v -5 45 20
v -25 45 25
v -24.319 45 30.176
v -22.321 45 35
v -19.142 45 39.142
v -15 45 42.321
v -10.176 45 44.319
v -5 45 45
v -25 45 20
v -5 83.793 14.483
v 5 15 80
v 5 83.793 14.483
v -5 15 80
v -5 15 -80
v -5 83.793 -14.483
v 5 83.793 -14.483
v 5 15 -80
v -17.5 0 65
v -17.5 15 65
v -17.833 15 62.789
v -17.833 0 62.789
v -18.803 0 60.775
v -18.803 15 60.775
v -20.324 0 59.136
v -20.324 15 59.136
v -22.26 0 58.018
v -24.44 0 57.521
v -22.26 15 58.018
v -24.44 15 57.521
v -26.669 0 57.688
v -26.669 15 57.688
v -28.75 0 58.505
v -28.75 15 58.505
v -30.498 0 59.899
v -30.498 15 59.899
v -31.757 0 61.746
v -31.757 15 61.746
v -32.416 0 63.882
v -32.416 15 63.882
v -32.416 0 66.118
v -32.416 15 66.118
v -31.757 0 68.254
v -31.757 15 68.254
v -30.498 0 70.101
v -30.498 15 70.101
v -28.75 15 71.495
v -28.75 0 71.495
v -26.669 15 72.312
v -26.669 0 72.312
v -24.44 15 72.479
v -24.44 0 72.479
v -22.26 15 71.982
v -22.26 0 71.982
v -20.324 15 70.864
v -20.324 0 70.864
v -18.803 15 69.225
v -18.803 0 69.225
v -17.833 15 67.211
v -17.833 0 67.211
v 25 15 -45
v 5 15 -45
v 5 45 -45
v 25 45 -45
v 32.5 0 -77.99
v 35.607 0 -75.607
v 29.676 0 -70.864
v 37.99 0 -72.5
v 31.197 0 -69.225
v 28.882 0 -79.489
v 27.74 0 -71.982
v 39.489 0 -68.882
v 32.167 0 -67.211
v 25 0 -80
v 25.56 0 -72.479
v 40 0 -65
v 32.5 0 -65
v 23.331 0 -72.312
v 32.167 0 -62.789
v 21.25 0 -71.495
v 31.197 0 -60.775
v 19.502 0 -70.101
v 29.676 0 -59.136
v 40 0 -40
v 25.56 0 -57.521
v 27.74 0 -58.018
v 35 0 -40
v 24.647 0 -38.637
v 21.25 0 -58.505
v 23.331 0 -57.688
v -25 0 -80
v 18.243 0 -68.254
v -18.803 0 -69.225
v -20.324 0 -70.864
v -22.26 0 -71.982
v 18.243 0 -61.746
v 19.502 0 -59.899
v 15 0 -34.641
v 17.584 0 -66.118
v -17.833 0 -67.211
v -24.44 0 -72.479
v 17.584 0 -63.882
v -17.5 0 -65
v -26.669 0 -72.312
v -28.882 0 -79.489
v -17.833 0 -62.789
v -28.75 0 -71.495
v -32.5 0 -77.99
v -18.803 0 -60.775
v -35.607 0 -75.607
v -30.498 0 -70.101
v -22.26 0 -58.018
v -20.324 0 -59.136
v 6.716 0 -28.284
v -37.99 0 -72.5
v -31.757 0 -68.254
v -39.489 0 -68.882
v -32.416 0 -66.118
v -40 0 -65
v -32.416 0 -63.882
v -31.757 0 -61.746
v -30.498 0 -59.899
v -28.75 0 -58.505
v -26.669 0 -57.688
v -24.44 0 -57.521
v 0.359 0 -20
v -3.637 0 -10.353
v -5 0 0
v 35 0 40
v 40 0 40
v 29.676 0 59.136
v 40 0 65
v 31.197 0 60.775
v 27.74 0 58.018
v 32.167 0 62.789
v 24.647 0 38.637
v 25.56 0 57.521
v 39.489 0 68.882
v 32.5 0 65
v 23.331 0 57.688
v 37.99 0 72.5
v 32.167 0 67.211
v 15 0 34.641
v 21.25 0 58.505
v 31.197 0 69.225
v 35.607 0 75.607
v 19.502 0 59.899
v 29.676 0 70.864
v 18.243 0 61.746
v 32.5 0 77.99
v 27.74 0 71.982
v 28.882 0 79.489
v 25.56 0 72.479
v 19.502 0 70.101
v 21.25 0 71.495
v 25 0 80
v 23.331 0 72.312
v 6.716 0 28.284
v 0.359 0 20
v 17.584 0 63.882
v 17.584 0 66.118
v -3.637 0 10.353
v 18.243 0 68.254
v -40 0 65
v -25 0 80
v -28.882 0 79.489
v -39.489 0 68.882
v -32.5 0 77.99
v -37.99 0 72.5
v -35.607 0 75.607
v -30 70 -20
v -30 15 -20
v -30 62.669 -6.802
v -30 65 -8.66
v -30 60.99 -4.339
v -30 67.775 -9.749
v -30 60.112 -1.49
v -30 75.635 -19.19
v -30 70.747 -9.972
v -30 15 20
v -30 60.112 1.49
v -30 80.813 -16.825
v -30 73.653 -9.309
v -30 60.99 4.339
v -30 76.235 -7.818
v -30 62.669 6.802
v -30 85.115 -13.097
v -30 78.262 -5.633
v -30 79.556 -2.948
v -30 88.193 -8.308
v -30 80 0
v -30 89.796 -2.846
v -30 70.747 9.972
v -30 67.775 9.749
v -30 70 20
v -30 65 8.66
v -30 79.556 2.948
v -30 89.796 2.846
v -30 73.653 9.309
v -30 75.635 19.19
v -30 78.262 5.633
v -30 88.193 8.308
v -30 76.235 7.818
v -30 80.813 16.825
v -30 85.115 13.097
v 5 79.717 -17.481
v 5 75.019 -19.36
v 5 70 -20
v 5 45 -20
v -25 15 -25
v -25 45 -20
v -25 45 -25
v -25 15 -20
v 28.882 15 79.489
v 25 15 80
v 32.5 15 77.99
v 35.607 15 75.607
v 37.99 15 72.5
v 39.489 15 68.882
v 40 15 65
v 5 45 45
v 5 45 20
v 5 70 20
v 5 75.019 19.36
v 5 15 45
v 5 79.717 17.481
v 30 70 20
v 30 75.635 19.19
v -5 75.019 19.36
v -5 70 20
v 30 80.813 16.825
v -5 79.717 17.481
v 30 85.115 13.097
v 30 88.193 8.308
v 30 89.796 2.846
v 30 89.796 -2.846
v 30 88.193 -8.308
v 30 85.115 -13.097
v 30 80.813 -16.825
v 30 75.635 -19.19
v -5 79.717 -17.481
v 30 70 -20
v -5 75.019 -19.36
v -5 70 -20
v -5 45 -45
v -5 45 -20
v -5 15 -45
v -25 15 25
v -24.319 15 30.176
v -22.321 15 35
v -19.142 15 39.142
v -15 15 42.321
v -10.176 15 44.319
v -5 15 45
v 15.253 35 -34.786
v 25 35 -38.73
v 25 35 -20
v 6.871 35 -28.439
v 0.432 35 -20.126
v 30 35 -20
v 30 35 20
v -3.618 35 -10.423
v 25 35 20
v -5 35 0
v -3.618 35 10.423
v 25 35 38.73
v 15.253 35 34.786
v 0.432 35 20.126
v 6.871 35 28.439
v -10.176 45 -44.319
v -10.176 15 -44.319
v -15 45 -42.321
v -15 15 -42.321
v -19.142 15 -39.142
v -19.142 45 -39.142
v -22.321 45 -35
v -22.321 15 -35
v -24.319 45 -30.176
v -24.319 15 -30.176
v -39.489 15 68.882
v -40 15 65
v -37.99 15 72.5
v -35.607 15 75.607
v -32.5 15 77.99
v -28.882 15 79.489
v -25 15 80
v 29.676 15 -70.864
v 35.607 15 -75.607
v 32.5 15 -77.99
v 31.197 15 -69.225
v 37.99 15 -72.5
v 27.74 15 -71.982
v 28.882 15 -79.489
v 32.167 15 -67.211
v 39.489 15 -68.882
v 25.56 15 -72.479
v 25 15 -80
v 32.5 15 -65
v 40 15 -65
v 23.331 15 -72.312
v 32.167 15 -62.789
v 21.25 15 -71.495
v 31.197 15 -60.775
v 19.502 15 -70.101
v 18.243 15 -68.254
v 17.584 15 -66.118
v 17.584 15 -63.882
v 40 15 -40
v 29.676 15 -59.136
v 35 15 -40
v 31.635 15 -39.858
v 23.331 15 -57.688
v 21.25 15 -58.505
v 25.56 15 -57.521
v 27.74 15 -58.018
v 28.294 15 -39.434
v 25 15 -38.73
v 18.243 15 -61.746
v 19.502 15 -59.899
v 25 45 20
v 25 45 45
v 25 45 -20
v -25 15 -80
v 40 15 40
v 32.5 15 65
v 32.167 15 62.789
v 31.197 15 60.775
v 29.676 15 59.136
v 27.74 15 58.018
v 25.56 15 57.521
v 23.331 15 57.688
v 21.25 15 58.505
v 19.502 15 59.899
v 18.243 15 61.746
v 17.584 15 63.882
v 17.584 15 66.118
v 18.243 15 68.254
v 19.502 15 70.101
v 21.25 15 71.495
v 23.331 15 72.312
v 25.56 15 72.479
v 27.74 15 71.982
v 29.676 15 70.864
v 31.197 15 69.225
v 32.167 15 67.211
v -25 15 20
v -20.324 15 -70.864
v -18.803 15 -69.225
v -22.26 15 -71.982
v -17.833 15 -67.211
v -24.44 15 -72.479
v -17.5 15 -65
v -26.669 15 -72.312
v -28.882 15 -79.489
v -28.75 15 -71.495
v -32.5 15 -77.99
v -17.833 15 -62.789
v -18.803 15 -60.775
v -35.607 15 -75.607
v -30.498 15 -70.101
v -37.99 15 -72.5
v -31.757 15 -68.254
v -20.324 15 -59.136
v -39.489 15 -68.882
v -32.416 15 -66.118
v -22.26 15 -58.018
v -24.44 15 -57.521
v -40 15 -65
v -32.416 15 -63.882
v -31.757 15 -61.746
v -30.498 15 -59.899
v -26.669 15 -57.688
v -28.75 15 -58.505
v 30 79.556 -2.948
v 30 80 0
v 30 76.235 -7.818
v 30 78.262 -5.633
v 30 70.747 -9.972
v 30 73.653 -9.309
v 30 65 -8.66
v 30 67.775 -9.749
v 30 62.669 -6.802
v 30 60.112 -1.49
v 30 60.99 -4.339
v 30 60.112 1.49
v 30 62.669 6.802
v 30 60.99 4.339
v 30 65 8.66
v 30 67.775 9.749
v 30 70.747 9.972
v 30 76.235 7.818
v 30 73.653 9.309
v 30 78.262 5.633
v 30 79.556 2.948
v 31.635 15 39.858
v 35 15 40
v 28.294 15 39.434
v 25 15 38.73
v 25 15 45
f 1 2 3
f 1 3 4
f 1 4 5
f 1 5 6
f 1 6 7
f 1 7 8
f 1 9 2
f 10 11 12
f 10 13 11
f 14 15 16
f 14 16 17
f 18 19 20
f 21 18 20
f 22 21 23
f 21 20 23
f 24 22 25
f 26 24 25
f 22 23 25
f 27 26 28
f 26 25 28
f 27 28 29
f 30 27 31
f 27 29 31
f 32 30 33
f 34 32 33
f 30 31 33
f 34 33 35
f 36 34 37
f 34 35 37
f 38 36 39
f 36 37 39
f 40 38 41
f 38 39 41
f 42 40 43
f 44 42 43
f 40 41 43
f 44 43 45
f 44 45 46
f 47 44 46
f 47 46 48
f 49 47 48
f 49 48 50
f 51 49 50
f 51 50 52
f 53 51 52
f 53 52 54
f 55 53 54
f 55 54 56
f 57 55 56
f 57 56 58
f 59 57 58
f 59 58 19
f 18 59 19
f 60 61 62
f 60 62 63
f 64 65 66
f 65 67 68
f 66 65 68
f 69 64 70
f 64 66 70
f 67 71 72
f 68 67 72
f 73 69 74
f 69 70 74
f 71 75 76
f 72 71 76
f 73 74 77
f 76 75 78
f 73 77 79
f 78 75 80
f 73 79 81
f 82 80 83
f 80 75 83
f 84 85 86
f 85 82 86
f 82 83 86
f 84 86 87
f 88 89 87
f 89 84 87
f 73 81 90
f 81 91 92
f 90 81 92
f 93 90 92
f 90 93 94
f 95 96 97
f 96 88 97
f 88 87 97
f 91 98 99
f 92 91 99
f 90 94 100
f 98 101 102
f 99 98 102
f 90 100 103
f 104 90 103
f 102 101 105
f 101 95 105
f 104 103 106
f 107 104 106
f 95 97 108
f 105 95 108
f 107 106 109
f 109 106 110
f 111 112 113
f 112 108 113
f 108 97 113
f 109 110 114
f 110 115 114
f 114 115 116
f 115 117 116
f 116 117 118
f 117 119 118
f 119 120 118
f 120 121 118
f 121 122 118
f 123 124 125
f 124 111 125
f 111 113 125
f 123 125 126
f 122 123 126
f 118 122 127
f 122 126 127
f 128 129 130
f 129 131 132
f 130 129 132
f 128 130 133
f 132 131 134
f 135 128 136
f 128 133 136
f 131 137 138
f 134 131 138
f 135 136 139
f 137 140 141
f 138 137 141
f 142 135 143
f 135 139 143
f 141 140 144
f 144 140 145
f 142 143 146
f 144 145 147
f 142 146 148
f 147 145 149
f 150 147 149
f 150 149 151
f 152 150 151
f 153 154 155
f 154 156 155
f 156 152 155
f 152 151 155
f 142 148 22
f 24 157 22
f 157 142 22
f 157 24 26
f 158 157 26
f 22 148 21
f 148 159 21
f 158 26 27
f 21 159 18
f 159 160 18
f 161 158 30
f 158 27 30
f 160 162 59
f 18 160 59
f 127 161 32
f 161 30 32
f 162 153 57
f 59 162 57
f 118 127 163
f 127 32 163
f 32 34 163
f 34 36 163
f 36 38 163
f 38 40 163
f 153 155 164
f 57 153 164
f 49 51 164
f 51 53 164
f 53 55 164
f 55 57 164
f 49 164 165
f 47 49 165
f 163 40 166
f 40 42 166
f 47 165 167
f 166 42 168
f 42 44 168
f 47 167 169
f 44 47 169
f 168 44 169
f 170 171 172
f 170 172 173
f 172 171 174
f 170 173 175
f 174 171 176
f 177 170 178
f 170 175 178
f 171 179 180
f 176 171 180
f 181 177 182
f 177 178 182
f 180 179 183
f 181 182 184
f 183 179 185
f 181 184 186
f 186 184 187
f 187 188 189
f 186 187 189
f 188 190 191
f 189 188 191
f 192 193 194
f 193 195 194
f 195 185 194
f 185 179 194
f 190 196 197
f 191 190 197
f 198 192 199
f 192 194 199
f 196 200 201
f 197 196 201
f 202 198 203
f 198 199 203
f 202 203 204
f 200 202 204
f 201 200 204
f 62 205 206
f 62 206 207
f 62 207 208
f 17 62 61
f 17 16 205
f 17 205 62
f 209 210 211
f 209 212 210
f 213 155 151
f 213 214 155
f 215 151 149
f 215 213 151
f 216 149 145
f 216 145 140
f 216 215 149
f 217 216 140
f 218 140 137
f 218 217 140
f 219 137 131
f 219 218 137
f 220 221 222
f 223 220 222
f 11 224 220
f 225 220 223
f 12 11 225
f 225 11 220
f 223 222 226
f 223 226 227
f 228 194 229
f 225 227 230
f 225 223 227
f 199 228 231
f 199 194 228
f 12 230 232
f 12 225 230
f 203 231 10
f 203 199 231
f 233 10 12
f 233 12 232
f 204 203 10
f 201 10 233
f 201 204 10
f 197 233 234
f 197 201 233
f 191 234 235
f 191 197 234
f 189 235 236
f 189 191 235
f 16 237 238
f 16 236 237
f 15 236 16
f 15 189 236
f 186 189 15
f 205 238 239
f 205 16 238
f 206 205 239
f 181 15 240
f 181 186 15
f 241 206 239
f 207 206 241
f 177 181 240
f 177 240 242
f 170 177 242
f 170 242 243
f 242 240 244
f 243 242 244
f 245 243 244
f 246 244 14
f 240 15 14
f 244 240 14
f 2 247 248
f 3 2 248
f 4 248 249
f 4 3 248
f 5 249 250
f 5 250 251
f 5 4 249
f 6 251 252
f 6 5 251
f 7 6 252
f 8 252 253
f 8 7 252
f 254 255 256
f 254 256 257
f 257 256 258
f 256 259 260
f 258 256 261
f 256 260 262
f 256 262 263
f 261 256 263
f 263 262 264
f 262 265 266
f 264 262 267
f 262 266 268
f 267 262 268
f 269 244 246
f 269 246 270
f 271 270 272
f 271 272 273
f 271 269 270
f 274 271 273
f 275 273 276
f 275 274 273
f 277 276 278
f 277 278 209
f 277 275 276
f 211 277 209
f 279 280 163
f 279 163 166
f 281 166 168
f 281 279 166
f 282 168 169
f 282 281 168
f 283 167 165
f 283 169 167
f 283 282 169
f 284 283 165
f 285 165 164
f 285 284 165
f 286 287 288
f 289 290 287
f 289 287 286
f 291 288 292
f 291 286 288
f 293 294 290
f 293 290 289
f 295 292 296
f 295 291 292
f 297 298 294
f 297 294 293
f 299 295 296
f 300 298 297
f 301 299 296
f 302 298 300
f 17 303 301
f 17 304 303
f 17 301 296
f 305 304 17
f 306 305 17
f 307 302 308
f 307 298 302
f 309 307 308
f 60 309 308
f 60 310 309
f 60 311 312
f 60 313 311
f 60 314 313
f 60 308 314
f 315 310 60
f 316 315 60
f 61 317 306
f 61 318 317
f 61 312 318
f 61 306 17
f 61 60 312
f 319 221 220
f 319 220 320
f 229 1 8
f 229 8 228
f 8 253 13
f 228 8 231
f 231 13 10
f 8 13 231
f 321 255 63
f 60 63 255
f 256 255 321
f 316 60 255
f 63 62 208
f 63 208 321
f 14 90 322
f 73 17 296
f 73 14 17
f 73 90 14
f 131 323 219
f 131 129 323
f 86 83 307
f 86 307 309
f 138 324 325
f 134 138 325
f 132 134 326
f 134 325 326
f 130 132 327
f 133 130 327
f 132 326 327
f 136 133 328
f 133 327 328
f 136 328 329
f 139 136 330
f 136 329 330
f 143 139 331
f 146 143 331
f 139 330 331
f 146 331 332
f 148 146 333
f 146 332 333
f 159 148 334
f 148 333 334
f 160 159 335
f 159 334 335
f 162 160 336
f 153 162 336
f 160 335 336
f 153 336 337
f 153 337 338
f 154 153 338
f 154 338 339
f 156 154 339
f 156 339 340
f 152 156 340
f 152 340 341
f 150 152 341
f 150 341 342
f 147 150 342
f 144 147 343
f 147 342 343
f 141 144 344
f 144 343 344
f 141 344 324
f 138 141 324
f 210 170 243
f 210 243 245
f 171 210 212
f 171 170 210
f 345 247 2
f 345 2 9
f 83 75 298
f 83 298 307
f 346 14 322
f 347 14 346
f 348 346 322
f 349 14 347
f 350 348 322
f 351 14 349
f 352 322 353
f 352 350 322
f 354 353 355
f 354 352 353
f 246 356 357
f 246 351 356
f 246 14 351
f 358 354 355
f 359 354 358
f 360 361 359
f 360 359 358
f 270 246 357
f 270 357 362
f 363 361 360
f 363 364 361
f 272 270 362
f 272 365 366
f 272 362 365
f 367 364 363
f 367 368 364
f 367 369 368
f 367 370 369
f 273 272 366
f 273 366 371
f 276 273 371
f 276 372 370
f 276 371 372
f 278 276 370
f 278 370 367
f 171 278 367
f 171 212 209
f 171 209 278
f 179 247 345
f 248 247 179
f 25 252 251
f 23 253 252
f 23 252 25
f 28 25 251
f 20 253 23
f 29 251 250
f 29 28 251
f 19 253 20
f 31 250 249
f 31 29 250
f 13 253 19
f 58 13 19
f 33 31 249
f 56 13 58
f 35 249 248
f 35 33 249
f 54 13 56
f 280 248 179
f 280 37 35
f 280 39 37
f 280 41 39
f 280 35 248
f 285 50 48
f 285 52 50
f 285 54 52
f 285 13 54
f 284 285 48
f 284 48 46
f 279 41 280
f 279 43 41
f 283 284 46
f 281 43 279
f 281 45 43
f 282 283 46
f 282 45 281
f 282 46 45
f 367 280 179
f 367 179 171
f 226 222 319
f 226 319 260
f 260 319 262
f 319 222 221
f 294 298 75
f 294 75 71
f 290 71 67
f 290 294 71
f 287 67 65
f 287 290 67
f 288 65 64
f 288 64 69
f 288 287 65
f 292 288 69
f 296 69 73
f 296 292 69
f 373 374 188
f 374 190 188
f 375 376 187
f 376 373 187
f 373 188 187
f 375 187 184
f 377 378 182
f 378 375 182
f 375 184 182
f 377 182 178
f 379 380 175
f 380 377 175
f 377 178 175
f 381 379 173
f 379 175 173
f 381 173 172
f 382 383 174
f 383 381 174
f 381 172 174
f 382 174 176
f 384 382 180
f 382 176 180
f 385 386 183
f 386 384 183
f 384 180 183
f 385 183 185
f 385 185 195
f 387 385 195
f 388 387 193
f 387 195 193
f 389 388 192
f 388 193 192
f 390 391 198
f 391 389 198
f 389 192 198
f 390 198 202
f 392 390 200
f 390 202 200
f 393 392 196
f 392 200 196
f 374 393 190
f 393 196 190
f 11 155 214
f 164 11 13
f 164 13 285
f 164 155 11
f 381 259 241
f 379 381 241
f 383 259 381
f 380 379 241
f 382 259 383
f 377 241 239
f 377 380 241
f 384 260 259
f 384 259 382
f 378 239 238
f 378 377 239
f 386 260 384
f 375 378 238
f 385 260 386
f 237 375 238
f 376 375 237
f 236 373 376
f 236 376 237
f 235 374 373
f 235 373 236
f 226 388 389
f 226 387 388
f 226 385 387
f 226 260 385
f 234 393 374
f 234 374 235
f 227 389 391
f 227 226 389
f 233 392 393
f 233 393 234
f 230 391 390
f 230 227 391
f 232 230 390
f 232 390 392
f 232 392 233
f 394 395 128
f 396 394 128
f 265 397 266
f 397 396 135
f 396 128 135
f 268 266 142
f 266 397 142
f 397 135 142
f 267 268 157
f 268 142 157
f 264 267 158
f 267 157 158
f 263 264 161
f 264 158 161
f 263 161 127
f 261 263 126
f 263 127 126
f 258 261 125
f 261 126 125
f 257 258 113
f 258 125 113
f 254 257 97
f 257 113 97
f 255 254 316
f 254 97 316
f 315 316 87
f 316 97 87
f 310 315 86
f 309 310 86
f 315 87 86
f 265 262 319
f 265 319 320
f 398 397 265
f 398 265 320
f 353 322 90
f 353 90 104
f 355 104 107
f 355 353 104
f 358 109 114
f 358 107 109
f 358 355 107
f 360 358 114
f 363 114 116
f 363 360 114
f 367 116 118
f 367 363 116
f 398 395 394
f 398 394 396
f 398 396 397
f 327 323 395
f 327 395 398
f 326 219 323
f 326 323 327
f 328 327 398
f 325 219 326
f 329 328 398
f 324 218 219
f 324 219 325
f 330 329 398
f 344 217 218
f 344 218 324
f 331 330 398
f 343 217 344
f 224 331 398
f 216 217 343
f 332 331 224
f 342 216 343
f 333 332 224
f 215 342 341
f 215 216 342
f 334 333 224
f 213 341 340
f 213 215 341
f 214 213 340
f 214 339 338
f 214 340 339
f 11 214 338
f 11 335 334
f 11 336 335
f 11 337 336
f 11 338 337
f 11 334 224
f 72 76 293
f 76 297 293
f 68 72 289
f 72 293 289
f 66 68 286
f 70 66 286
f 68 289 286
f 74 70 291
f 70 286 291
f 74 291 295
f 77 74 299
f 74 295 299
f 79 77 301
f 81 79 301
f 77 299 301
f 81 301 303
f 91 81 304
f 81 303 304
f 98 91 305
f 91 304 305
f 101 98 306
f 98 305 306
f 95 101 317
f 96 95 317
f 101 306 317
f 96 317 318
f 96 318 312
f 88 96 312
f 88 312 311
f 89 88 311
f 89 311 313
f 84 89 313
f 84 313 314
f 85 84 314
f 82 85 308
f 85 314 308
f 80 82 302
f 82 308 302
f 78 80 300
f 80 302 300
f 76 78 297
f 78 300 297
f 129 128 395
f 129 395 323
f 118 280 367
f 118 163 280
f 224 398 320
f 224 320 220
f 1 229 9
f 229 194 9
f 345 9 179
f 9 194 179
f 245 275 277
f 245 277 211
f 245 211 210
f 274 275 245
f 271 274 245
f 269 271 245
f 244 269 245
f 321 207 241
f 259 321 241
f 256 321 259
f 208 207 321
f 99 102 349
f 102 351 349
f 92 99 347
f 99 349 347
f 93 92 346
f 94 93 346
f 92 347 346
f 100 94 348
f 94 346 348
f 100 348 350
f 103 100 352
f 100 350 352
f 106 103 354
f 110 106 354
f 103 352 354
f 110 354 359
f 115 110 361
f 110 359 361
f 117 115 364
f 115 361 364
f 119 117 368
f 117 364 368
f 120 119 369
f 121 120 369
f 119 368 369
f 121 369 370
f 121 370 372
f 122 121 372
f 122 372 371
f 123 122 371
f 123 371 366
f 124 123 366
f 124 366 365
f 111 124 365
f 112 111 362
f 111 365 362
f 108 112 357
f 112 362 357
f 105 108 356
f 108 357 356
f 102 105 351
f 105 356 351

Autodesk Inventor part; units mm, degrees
ref_plane "YZ Plane" through (0, 0, 0) normal (1, 0, 0) x (0, 1, 0)
ref_plane "XZ Plane" through (0, 0, 0) normal (0, 1, 0) x (-1, 0, 0)
ref_plane "XY Plane" through (0, 0, 0) normal (0, 0, 1) x (1, 0, 0)
sketch "草图1" plane through (0, 0, 0) normal (0, 1, 0) x (-1, 0, 0)
  line L0 (-40, 80) -> (40, 80)
  line L1 (40, 80) -> (40, -80)
  line L2 (40, -80) -> (-40, -80)
  line L3 (-40, -80) -> (-40, 80)
  line L4 (-40, 80) -> (40, -80) construction
  line L5 (40, 80) -> (-40, -80) construction
  point P0 (0, 0)
  dimension "d0" = 160
  dimension "d1" = 80
extrude "拉伸1" add sketch "草图1" along normal blind 15
sketch "草图2" plane through (0, 15, 0) normal (0, 1, 0) x (1, 0, 0)
  line L0 (25, -45) -> (-25, -45)
  line L1 (-25, -45) -> (-25, 45)
  line L2 (-25, 45) -> (25, 45)
  line L3 (25, 45) -> (25, -45)
  line L4 (25, -45) -> (-25, 45) construction
  line L5 (-25, -45) -> (25, 45) construction
  point P0 (0, 0)
  dimension "d4" = 90
  dimension "d5" = 50
extrude "拉伸2" add sketch "草图2" along normal blind 30
sketch "草图3" plane through (0, 0, 0) normal (1, 0, 0) x (0, 1, 0)
  line L0 (0, 0) -> (70, 0) construction
  arc A0 (70, -20) -> (70, 20) centre (70, 0) ccw
  line L1 (70, 20) -> (15, 20)
  line L2 (15, -80) -> (15, 80) construction
  line L3 (70, -20) -> (15, -20)
  line L4 (15, -20) -> (15, 20)
  circle A1 centre (70, 0) radius 10
  line L5 (0, 80) -> (0, -80) projected
  dimension "d8" = 20
  dimension "d9" = 20
  dimension "d10" = 70
extrude "拉伸3" add sketch "草图3" along normal mid plane 60
sketch "草图4" plane through (0, 15, 0) normal (0, 1, 0) x (1, 0, 0)
  line L0 (25, -65) -> (-25, -65) construction
  line L1 (-25, -65) -> (-25, 65) construction
  line L2 (-25, 65) -> (25, 65) construction
  line L3 (25, 65) -> (25, -65) construction
  line L4 (25, -65) -> (-25, 65) construction
  line L5 (-25, -65) -> (25, 65) construction
  circle A0 centre (-25, -65) radius 7.5
  circle A1 centre (-25, 65) radius 7.5
  circle A2 centre (25, 65) radius 7.5
  circle A3 centre (25, -65) radius 7.5
  point P0 (0, 0)
  dimension "d13" = 130
  dimension "d14" = 50
  dimension "d15" = 15
extrude "拉伸4" cut sketch "草图4" against normal blind 60
fillet "圆角1" radius 15 4 edges at (40, 7.5, 80) (40, 7.5, -80) (-40, 7.5, 80) (-40, 7.5, -80)
fillet "圆角2" radius 20 2 edges at (-25, 30, -45) (-25, 30, 45)
sketch "草图5" plane through (0, 0, 0) normal (0, 1, 0) x (-1, 0, 0)
  line L0 (0, 0) -> (-35, 0) construction
  arc A0 (-35, -40) -> (-35, 40) centre (-35, 0) ccw
  line L1 (-40, 65) -> (-40, -65) construction
  line L2 (-35, 40) -> (-40, 40)
  line L3 (-40, 40) -> (-40, -40)
  line L4 (-40, -40) -> (-35, -40)
  dimension "d20" = 5
  dimension "d21" = 40
extrude "拉伸5" cut sketch "草图5" along normal blind 35
sketch "草图6" plane through (0, 0, 0) normal (1, 0, 0) x (0, 1, 0)
  arc A0 (70, -20) -> (70, 20) centre (70, 0) ccw projected
  line L0 (70, 20) -> (35, 20) projected
  line L1 (45, 45) -> (45, 20) projected
  line L2 (15, 45) -> (45, 45) projected
  line L3 (15, 65) -> (15, 40) projected
  line L4 (15, 80) -> (15, 65) projected
  line L5 (15, 80) -> (83.7931, 14.4828)
  arc A1 (70, -20) -> (70, 20) centre (70, 0) ccw projected
  arc A2 (83.7931, 14.4828) -> (70, 20) centre (70, 0) ccw
  line L6 (45, 20) -> (45, 25) projected
  line L7 (70, 20) -> (45, 20)
  line L8 (45, 45) -> (45, 25) projected
  line L9 (45, 20) -> (45, 45)
  line L10 (15, 45) -> (45, 45) projected
  line L11 (45, 45) -> (15, 45)
  line L12 (15, 80) -> (15, 65) projected
  line L13 (15, 45) -> (15, 80)
  point P0 (0, 0)
extrude "拉伸6" add sketch "草图6" along normal mid plane 10
mirror "镜像1" about plane through (0, 0, 0) normal (0, 0, 1) of "拉伸6"
properties part number "模型2"
